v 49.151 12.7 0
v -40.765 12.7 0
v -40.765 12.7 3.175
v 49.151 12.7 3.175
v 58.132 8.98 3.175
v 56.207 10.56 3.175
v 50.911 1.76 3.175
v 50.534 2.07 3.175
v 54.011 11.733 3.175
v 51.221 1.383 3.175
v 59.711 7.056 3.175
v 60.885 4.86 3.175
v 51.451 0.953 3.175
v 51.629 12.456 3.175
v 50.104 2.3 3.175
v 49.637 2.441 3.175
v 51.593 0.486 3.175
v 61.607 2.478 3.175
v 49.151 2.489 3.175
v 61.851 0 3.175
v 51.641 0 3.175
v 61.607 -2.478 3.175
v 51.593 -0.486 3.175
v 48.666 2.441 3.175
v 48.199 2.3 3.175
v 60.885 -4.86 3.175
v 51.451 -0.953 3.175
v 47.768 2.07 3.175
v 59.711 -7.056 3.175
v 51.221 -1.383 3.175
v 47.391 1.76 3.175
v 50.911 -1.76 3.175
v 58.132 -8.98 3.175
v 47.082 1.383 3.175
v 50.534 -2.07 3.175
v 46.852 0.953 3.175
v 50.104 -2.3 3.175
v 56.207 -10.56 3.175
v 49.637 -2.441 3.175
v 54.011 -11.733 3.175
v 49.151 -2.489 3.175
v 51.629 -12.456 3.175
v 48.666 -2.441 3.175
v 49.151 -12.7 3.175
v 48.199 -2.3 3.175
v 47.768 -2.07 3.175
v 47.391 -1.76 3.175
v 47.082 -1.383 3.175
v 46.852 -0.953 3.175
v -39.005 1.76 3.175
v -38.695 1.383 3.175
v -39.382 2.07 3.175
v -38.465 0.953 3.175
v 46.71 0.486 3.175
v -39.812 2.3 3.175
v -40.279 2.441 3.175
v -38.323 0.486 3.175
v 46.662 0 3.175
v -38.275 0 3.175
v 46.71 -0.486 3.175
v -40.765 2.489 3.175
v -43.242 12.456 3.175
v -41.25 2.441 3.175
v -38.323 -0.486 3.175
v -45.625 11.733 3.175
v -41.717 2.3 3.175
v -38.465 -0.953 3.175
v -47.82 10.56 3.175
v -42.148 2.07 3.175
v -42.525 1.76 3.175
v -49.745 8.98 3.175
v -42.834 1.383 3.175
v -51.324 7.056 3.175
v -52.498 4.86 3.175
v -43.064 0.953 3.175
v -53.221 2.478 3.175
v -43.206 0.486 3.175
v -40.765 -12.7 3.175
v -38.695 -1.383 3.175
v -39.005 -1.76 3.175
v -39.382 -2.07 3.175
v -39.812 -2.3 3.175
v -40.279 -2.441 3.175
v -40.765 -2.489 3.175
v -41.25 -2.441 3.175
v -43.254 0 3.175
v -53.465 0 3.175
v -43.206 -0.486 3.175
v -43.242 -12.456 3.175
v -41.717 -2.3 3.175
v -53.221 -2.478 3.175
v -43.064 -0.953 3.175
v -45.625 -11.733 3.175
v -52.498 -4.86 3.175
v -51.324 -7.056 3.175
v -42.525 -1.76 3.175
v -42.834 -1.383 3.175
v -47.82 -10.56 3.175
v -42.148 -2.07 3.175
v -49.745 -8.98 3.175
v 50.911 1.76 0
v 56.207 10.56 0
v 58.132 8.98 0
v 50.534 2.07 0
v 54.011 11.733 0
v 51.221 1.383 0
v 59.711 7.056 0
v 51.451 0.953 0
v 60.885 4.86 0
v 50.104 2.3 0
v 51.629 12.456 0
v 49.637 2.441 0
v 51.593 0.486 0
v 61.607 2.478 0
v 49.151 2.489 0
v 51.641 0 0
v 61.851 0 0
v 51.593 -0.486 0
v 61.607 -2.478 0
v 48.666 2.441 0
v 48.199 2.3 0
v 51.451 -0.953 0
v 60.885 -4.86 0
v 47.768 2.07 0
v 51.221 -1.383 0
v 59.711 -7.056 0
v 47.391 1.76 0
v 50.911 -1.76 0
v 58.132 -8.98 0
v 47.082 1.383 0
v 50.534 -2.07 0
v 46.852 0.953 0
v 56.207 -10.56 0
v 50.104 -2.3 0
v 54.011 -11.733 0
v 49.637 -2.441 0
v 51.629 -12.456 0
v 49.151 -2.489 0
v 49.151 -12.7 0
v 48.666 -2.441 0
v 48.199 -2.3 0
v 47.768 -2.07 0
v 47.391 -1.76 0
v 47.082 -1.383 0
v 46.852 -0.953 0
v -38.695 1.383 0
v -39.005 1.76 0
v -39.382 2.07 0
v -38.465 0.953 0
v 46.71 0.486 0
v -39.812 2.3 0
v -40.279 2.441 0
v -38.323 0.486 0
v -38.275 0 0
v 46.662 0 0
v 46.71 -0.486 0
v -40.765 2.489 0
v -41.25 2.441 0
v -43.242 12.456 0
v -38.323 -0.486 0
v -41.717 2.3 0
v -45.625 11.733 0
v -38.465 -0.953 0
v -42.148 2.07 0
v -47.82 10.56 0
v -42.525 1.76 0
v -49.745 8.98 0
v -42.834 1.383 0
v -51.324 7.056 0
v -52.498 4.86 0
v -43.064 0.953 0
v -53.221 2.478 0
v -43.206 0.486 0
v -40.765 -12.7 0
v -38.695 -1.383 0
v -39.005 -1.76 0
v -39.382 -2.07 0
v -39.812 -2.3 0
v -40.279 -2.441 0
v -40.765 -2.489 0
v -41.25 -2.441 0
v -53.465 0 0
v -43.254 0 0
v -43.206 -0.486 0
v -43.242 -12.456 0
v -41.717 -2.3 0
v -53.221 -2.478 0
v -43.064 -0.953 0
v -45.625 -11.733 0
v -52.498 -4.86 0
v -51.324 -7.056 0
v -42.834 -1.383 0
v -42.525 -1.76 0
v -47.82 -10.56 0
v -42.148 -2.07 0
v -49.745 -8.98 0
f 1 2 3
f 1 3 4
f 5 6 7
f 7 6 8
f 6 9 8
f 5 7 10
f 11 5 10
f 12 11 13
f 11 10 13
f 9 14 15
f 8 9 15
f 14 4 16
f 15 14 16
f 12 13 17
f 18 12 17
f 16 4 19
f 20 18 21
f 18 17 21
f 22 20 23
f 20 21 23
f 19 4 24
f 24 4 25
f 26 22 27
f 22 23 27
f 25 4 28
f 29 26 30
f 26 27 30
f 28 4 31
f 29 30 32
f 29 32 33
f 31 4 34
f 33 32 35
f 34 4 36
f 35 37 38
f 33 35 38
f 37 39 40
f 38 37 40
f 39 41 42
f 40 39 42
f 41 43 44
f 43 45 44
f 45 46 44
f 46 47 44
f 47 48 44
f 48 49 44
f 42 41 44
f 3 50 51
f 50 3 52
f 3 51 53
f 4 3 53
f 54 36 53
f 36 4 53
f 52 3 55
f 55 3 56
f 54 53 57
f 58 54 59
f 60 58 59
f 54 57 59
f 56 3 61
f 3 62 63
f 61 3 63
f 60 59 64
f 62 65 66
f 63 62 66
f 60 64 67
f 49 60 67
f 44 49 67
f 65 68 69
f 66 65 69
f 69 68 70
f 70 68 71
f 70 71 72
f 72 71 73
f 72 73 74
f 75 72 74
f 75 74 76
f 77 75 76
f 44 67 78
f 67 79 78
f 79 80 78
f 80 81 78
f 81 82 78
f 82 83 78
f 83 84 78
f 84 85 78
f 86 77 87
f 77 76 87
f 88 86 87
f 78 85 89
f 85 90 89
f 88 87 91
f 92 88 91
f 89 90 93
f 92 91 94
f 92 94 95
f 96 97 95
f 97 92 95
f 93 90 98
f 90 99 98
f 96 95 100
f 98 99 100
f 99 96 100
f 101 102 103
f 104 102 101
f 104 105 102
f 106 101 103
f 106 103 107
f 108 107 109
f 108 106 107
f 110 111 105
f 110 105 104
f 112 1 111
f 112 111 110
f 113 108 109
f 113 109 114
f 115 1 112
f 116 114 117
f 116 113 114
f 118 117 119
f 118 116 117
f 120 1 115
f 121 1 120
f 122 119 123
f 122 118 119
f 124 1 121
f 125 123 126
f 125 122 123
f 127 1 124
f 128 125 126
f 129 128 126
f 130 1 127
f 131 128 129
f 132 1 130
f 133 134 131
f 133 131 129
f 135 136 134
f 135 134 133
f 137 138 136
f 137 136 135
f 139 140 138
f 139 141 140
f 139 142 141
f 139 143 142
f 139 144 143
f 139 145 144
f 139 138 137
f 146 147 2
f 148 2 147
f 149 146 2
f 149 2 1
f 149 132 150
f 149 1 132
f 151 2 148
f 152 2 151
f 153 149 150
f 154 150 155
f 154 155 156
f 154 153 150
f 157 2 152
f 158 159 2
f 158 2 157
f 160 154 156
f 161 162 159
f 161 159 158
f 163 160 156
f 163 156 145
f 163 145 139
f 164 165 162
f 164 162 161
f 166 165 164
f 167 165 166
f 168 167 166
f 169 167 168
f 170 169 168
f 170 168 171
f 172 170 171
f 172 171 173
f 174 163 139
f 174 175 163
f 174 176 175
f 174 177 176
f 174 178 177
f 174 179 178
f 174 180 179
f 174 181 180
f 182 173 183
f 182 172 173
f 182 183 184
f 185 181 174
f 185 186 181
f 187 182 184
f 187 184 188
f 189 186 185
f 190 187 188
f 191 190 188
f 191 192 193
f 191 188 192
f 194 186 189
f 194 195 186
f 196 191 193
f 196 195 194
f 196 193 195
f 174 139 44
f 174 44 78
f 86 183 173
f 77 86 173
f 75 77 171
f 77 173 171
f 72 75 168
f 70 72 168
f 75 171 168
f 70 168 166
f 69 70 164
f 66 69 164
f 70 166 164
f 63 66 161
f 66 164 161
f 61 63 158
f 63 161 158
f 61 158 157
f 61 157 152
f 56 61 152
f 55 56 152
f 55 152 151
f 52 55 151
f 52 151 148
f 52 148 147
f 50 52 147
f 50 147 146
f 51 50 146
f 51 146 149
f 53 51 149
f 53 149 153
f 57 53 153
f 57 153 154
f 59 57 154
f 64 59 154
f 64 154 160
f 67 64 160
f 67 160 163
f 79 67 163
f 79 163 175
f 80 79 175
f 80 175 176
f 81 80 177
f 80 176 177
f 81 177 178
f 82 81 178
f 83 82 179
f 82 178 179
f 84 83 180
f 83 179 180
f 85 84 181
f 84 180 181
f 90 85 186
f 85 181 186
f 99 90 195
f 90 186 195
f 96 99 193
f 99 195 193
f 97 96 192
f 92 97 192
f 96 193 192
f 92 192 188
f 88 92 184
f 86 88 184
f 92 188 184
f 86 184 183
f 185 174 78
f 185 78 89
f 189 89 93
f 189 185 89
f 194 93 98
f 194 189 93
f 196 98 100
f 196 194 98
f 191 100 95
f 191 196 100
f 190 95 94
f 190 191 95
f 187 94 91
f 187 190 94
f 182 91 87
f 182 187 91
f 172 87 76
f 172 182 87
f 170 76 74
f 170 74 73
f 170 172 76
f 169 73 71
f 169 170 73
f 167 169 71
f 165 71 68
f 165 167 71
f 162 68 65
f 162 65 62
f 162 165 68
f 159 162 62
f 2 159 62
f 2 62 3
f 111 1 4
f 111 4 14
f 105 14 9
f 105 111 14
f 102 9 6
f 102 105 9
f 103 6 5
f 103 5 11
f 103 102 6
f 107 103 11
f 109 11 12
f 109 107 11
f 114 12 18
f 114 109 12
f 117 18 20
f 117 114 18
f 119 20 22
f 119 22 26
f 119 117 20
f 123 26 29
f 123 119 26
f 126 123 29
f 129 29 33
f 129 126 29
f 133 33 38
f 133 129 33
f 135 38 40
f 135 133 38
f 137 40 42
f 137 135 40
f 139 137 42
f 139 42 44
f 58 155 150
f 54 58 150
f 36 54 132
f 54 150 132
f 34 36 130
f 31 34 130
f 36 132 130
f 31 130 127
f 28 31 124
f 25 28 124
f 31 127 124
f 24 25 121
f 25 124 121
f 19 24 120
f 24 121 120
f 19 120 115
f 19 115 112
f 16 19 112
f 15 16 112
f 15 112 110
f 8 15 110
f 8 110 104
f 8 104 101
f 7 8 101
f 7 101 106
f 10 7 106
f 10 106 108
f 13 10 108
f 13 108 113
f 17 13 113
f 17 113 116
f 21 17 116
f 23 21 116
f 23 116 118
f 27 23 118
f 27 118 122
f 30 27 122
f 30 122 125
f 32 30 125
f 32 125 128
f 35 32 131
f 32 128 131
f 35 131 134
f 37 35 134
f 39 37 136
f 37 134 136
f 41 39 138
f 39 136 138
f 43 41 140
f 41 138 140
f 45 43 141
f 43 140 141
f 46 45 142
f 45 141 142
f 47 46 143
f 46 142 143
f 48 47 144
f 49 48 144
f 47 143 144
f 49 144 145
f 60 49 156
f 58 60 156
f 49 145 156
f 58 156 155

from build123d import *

# Parameters (mm, degrees)
BOSS_EXTRUDE1_DEPTH        = 3.175
F_9_0_196_DIAMETER_HOLE1_D = 4.9784


with BuildPart() as part:
    # Sketch1 → Boss-Extrude1 (new body)
    with BuildSketch(Plane(origin=(0, 0, 0), x_dir=(0, 1, 0), z_dir=(0, 0, 1))):
        with BuildLine():
            Line((-12.7, -49.151299627), (-12.7, 40.764697174))
            ThreePointArc((-12.7, 40.764697174), (0, 53.464697174), (12.7, 40.764697174))
            Line((12.7, 40.764697174), (12.7, -49.151302826))
            ThreePointArc((12.7, -49.151302826), (-1.599e-06, -61.851302826), (-12.7, -49.151299627))
        make_face()
    extrude(amount=BOSS_EXTRUDE1_DEPTH)

    # #9 (0.196) Diameter Hole1 (through all)
    with Locations(Plane.XY.offset(3.175)):
        with Locations((-40.764697174, 0), (49.151302826, 0)):
            Hole(F_9_0_196_DIAMETER_HOLE1_D / 2)


solid = part.part
